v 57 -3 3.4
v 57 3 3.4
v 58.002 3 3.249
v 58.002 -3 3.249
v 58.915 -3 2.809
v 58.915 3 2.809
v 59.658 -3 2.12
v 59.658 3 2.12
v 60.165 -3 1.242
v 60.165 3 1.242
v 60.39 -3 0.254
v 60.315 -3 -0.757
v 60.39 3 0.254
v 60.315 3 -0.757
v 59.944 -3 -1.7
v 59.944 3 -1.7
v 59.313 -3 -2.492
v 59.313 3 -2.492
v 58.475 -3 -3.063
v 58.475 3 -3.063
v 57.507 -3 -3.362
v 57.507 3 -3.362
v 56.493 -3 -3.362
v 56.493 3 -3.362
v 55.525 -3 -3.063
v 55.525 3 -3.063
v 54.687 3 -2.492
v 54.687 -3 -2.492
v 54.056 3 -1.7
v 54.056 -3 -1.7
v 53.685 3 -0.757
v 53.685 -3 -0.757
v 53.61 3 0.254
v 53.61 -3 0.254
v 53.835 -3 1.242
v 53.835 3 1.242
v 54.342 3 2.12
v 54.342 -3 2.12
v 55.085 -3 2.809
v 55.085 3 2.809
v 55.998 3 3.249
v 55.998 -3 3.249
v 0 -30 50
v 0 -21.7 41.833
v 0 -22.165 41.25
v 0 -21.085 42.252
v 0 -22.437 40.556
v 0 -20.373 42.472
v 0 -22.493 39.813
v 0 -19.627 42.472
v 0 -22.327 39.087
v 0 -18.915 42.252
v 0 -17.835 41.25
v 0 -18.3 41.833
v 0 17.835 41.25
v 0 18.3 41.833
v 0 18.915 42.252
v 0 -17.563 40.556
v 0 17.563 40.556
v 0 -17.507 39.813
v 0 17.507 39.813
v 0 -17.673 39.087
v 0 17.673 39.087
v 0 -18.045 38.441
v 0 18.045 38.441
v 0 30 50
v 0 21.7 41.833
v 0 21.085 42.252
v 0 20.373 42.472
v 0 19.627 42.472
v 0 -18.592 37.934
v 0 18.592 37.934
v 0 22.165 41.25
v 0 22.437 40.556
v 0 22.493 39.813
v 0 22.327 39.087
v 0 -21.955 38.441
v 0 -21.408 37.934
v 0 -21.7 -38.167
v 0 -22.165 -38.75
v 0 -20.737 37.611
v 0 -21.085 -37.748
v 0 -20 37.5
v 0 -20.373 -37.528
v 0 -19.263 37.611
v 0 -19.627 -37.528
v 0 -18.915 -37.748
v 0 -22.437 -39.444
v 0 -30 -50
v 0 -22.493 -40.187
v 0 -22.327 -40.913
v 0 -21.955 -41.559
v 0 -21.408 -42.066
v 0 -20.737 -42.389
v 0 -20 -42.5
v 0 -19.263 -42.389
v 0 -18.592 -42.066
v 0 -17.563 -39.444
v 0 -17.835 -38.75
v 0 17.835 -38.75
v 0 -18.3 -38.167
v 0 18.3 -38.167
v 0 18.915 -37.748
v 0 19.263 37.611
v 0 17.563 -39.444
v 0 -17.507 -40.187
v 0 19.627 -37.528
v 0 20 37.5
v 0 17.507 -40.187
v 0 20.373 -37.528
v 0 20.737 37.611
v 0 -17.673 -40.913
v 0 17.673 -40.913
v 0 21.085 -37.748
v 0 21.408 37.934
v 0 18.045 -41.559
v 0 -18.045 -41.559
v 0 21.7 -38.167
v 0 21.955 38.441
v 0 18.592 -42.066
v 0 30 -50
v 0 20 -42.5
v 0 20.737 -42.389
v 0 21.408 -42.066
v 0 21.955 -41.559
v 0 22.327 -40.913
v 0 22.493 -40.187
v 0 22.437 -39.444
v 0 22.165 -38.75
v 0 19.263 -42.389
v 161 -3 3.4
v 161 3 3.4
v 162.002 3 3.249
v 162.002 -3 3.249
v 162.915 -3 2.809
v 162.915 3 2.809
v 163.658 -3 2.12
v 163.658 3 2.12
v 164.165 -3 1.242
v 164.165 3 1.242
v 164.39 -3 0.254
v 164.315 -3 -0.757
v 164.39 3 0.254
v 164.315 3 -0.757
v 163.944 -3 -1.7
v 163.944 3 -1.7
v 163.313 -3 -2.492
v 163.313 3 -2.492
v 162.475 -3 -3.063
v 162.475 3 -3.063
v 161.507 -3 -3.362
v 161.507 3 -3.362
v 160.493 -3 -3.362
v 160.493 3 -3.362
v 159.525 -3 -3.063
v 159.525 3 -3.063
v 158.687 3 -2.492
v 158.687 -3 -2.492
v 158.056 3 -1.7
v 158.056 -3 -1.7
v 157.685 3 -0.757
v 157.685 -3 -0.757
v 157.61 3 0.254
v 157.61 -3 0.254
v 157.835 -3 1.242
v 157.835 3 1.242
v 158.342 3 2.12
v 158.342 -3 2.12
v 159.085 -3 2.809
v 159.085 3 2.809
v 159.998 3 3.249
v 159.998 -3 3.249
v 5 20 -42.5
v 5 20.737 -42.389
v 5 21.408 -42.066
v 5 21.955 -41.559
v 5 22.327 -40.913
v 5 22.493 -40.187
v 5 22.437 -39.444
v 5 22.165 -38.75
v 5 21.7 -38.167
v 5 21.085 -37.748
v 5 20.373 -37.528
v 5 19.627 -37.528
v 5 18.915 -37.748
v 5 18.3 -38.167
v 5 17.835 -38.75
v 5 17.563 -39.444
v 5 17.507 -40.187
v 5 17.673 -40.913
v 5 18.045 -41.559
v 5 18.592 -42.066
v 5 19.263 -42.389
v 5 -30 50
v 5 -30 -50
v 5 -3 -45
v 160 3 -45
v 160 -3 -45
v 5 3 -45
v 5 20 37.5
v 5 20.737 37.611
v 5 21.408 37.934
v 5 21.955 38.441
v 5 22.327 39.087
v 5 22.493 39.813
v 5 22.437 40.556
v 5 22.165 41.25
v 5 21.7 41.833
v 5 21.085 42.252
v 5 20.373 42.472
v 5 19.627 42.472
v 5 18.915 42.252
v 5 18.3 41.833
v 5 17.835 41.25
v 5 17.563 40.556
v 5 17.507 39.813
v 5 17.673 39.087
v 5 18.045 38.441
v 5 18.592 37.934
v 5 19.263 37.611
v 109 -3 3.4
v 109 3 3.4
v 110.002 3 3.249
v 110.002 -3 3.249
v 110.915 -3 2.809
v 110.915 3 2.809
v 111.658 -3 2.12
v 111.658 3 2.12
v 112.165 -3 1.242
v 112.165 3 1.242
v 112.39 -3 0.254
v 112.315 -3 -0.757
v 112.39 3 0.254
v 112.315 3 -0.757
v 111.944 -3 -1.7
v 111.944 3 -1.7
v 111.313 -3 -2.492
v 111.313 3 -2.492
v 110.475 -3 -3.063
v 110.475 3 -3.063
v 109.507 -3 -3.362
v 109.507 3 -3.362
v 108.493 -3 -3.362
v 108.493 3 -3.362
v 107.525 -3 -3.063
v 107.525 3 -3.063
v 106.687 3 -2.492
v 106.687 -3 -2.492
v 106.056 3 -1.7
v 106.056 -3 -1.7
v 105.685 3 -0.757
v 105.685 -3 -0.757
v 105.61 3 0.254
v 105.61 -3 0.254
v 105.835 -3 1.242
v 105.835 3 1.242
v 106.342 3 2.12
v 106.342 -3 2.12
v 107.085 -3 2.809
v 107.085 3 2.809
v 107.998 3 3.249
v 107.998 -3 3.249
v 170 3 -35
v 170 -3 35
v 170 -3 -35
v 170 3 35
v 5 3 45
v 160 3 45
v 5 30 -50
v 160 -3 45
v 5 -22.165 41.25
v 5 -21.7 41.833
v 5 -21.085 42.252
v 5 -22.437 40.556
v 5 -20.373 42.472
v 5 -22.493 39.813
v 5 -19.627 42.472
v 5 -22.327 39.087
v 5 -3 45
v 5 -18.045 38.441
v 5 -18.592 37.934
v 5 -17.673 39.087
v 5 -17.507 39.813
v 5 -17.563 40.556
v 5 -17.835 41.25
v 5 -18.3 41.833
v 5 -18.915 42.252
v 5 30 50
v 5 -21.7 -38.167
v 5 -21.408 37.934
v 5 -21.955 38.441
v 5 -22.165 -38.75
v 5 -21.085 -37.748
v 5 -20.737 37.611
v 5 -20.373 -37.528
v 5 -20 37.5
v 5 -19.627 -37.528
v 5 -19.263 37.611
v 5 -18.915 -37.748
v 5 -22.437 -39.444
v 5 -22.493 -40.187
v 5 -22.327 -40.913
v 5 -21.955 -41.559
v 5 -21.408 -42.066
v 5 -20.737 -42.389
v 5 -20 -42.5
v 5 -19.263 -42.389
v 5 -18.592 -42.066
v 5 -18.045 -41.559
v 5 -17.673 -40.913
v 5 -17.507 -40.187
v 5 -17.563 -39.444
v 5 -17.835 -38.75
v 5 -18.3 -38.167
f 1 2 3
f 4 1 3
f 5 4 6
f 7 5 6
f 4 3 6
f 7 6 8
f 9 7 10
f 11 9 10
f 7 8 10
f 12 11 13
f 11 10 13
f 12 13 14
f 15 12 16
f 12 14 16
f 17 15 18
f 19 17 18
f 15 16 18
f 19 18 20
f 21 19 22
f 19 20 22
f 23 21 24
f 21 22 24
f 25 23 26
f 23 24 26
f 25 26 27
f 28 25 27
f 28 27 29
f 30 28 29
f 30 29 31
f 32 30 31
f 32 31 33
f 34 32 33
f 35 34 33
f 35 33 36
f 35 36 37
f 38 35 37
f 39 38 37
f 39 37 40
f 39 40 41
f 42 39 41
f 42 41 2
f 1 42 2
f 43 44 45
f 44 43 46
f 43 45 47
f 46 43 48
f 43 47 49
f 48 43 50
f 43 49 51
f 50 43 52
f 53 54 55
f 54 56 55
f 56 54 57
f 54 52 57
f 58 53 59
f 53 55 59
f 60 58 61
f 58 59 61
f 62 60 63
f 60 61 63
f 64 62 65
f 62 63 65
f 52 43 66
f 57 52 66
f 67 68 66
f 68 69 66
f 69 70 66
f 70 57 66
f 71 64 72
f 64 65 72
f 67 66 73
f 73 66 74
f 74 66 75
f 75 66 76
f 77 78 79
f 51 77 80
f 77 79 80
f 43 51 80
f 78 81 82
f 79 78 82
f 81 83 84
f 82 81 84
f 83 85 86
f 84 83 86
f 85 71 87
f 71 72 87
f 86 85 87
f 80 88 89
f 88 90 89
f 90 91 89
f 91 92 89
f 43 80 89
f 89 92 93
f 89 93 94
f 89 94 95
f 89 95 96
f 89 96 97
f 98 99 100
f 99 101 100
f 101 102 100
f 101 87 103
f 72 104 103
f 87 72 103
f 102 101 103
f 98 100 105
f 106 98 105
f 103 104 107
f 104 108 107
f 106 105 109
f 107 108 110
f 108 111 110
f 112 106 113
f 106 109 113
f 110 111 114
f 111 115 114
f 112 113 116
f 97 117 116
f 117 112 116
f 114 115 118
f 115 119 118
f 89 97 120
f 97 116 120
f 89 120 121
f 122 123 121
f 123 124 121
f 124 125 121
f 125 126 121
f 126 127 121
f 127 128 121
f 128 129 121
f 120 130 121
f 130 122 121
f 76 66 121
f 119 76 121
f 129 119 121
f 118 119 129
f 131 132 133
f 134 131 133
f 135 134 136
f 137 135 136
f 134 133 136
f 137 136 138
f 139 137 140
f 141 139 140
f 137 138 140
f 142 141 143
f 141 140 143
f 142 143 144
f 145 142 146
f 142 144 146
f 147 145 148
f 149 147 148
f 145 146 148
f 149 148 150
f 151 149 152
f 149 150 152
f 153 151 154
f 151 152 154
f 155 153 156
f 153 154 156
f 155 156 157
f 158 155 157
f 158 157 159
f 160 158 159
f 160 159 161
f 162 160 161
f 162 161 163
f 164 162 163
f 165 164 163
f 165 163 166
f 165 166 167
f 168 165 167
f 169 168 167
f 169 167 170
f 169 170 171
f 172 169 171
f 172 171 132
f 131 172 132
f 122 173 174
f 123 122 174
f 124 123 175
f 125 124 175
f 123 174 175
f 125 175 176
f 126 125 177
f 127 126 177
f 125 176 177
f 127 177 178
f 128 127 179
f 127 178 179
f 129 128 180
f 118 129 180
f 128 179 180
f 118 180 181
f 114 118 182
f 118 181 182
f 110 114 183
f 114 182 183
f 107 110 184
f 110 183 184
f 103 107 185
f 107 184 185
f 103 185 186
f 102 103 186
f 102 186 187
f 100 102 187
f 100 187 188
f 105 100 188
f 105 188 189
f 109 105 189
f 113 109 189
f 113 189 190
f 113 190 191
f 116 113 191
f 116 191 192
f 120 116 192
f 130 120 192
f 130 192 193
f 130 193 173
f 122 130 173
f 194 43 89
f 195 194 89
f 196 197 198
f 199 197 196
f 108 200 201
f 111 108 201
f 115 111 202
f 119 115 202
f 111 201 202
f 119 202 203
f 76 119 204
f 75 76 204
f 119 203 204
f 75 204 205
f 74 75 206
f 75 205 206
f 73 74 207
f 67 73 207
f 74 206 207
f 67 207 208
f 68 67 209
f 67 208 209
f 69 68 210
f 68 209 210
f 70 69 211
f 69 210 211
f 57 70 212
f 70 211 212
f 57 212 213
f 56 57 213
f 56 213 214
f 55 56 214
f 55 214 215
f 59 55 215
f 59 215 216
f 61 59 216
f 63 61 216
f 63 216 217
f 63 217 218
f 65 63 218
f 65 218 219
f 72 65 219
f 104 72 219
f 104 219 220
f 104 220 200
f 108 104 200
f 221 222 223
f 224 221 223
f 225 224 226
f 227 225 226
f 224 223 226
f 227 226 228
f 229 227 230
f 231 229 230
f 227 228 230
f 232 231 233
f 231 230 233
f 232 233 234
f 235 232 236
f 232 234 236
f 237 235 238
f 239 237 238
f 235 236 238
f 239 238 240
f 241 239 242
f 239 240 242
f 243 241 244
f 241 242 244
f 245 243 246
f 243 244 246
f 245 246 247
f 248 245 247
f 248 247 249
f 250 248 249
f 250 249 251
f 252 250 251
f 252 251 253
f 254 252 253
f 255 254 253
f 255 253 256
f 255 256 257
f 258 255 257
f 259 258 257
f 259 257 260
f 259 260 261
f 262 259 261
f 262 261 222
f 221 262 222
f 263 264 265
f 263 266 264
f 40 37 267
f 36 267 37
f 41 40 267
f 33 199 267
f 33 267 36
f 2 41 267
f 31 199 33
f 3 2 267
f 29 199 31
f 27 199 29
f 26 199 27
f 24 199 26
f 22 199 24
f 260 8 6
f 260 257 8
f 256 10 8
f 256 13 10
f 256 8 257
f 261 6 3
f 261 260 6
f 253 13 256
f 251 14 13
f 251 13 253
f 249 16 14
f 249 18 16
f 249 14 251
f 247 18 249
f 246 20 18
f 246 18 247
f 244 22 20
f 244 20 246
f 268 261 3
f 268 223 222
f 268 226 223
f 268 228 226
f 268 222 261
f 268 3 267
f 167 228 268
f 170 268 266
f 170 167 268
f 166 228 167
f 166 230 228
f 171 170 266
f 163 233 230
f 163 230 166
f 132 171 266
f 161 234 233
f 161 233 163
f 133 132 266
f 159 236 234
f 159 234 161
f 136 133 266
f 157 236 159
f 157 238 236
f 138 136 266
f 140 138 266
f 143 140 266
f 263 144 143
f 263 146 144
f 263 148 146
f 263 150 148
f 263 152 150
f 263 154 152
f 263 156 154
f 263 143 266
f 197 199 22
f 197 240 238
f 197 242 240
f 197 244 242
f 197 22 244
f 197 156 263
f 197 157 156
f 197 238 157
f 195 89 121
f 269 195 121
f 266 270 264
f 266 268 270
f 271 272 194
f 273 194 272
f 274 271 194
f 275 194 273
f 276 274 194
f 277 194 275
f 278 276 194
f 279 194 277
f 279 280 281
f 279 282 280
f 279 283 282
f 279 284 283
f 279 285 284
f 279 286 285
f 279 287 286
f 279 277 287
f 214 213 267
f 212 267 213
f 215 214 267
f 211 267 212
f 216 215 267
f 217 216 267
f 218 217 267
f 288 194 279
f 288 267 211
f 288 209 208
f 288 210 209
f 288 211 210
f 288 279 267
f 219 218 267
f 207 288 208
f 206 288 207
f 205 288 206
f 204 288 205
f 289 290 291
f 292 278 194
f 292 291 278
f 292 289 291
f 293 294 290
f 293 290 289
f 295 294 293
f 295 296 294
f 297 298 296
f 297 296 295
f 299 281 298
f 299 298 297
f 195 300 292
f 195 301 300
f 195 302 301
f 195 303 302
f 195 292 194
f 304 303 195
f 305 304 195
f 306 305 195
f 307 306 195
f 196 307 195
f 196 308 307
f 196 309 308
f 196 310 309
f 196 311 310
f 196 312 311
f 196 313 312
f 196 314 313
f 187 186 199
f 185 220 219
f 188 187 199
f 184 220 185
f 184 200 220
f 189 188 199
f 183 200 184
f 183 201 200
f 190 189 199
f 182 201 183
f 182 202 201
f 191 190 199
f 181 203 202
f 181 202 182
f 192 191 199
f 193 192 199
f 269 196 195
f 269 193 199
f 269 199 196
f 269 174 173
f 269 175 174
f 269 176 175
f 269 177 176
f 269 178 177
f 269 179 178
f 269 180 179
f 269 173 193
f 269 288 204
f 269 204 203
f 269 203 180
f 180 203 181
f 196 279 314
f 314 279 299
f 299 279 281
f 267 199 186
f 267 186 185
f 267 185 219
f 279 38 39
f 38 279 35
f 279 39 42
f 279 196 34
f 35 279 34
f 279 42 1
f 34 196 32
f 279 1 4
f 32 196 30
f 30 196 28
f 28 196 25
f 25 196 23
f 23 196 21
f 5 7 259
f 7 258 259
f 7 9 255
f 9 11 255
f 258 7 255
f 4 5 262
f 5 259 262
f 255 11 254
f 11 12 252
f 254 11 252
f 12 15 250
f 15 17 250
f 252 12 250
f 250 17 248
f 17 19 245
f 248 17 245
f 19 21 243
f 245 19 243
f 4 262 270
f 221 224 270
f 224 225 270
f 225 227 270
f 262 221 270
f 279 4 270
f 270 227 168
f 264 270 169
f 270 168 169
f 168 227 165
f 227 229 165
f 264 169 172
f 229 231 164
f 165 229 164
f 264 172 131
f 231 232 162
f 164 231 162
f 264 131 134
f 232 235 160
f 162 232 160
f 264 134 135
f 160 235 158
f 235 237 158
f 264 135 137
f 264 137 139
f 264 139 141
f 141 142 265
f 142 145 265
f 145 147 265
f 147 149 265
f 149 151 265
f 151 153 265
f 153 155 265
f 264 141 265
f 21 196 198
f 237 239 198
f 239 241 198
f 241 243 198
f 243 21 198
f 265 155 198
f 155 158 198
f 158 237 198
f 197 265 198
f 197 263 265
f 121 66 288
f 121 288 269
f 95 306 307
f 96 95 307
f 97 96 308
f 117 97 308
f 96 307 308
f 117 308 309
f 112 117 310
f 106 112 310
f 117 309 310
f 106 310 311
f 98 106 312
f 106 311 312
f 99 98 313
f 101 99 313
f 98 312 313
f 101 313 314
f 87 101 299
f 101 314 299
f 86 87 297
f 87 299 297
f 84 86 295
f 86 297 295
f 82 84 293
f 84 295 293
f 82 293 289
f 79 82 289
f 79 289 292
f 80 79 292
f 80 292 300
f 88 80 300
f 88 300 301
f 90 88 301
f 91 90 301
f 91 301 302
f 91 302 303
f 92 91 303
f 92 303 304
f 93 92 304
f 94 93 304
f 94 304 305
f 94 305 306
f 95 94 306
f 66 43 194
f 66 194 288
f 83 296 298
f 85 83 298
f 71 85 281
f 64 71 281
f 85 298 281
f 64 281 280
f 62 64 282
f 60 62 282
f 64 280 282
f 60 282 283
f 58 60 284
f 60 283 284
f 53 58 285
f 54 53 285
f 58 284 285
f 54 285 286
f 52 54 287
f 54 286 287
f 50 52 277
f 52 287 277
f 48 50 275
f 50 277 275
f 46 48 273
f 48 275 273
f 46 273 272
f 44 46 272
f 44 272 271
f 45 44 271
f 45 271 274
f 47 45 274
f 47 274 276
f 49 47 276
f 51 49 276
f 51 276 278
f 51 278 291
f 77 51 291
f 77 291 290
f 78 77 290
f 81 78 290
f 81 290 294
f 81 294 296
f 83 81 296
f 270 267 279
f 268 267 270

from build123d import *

# Parameters (mm, degrees)
SKETCH_1_W          = 100
SKETCH_1_H          = 60
EXTRUDE_1_DEPTH     = 5
CUT_EXTRUDE_1_REACH = 7
SKETCH_2_R          = 2.5
EXTRUDE_2_DEPTH     = 3
CUT_EXTRUDE_2_REACH = 35
SKETCH_4_R          = 3.4


with BuildPart() as part:
    # 스케치1 → 보스-돌출1 (new body)
    with BuildSketch(Plane(origin=(0, 0, 0), x_dir=(0, 0, -1), z_dir=(1, 0, 0))):
        Rectangle(SKETCH_1_W, SKETCH_1_H)
    extrude(amount=EXTRUDE_1_DEPTH)

    # 스케치2 → 컷-돌출1 (cut, up to next)
    with BuildSketch(Plane(origin=(5, 0, 0), x_dir=(0, 0, -1), z_dir=(1, 0, 0)), mode=Mode.PRIVATE) as cut_extrude_1_sk1:
        with Locations((-40, 20)):
            Circle(SKETCH_2_R)
    cut_extrude_1_tool1 = extrude(cut_extrude_1_sk1.sketch, amount=-CUT_EXTRUDE_1_REACH, mode=Mode.PRIVATE) & part.part
    add(cut_extrude_1_tool1.solids().sort_by_distance((5, 20, 40))[0], mode=Mode.SUBTRACT)
    # 스케치2 → 컷-돌출1 (cut, up to next)
    with BuildSketch(Plane(origin=(5, 0, 0), x_dir=(0, 0, -1), z_dir=(1, 0, 0)), mode=Mode.PRIVATE) as cut_extrude_1_sk2:
        with Locations((-40, -20)):
            Circle(SKETCH_2_R)
    cut_extrude_1_tool2 = extrude(cut_extrude_1_sk2.sketch, amount=-CUT_EXTRUDE_1_REACH, mode=Mode.PRIVATE) & part.part
    add(cut_extrude_1_tool2.solids().sort_by_distance((5, -20, 40))[0], mode=Mode.SUBTRACT)
    # 스케치2 → 컷-돌출1 (cut, up to next)
    with BuildSketch(Plane(origin=(5, 0, 0), x_dir=(0, 0, -1), z_dir=(1, 0, 0)), mode=Mode.PRIVATE) as cut_extrude_1_sk3:
        with Locations((40, -20)):
            Circle(SKETCH_2_R)
    cut_extrude_1_tool3 = extrude(cut_extrude_1_sk3.sketch, amount=-CUT_EXTRUDE_1_REACH, mode=Mode.PRIVATE) & part.part
    add(cut_extrude_1_tool3.solids().sort_by_distance((5, -20, -40))[0], mode=Mode.SUBTRACT)
    # 스케치2 → 컷-돌출1 (cut, up to next)
    with BuildSketch(Plane(origin=(5, 0, 0), x_dir=(0, 0, -1), z_dir=(1, 0, 0)), mode=Mode.PRIVATE) as cut_extrude_1_sk4:
        with Locations((40, 20)):
            Circle(SKETCH_2_R)
    cut_extrude_1_tool4 = extrude(cut_extrude_1_sk4.sketch, amount=-CUT_EXTRUDE_1_REACH, mode=Mode.PRIVATE) & part.part
    add(cut_extrude_1_tool4.solids().sort_by_distance((5, 20, -40))[0], mode=Mode.SUBTRACT)

    # 스케치3 → 보스-돌출2 (add, symmetric)
    with BuildSketch(Plane(origin=(0, 0, 0), x_dir=(1, 0, 0), z_dir=(0, 1, 0))):
        Polygon((170, 35), (160, 45), (5, 45), (5, -45), (160, -45), (170, -35), align=None)
    extrude(amount=EXTRUDE_2_DEPTH, both=True)

    # 스케치4 → 컷-돌출2 (cut, up to next)
    with BuildSketch(Plane(origin=(0, 3, 0), x_dir=(1, 0, 0), z_dir=(0, 1, 0)), mode=Mode.PRIVATE) as cut_extrude_2_sk1:
        with Locations(Location((57, 0, 0), (0, 0, 270))):  # turned: the seam where the file's is
            Circle(SKETCH_4_R)
    cut_extrude_2_tool1 = extrude(cut_extrude_2_sk1.sketch, amount=-CUT_EXTRUDE_2_REACH, mode=Mode.PRIVATE) & part.part
    add(cut_extrude_2_tool1.solids().sort_by_distance((57, 3, 0))[0], mode=Mode.SUBTRACT)
    # 스케치4 → 컷-돌출2 (cut, up to next)
    with BuildSketch(Plane(origin=(0, 3, 0), x_dir=(1, 0, 0), z_dir=(0, 1, 0)), mode=Mode.PRIVATE) as cut_extrude_2_sk2:
        with Locations(Location((109, 0, 0), (0, 0, 270))):  # turned: the seam where the file's is
            Circle(SKETCH_4_R)
    cut_extrude_2_tool2 = extrude(cut_extrude_2_sk2.sketch, amount=-CUT_EXTRUDE_2_REACH, mode=Mode.PRIVATE) & part.part
    add(cut_extrude_2_tool2.solids().sort_by_distance((109, 3, 0))[0], mode=Mode.SUBTRACT)
    # 스케치4 → 컷-돌출2 (cut, up to next)
    with BuildSketch(Plane(origin=(0, 3, 0), x_dir=(1, 0, 0), z_dir=(0, 1, 0)), mode=Mode.PRIVATE) as cut_extrude_2_sk3:
        with Locations(Location((161, 0, 0), (0, 0, 270))):  # turned: the seam where the file's is
            Circle(SKETCH_4_R)
    cut_extrude_2_tool3 = extrude(cut_extrude_2_sk3.sketch, amount=-CUT_EXTRUDE_2_REACH, mode=Mode.PRIVATE) & part.part
    add(cut_extrude_2_tool3.solids().sort_by_distance((161, 3, 0))[0], mode=Mode.SUBTRACT)


solid = part.part
